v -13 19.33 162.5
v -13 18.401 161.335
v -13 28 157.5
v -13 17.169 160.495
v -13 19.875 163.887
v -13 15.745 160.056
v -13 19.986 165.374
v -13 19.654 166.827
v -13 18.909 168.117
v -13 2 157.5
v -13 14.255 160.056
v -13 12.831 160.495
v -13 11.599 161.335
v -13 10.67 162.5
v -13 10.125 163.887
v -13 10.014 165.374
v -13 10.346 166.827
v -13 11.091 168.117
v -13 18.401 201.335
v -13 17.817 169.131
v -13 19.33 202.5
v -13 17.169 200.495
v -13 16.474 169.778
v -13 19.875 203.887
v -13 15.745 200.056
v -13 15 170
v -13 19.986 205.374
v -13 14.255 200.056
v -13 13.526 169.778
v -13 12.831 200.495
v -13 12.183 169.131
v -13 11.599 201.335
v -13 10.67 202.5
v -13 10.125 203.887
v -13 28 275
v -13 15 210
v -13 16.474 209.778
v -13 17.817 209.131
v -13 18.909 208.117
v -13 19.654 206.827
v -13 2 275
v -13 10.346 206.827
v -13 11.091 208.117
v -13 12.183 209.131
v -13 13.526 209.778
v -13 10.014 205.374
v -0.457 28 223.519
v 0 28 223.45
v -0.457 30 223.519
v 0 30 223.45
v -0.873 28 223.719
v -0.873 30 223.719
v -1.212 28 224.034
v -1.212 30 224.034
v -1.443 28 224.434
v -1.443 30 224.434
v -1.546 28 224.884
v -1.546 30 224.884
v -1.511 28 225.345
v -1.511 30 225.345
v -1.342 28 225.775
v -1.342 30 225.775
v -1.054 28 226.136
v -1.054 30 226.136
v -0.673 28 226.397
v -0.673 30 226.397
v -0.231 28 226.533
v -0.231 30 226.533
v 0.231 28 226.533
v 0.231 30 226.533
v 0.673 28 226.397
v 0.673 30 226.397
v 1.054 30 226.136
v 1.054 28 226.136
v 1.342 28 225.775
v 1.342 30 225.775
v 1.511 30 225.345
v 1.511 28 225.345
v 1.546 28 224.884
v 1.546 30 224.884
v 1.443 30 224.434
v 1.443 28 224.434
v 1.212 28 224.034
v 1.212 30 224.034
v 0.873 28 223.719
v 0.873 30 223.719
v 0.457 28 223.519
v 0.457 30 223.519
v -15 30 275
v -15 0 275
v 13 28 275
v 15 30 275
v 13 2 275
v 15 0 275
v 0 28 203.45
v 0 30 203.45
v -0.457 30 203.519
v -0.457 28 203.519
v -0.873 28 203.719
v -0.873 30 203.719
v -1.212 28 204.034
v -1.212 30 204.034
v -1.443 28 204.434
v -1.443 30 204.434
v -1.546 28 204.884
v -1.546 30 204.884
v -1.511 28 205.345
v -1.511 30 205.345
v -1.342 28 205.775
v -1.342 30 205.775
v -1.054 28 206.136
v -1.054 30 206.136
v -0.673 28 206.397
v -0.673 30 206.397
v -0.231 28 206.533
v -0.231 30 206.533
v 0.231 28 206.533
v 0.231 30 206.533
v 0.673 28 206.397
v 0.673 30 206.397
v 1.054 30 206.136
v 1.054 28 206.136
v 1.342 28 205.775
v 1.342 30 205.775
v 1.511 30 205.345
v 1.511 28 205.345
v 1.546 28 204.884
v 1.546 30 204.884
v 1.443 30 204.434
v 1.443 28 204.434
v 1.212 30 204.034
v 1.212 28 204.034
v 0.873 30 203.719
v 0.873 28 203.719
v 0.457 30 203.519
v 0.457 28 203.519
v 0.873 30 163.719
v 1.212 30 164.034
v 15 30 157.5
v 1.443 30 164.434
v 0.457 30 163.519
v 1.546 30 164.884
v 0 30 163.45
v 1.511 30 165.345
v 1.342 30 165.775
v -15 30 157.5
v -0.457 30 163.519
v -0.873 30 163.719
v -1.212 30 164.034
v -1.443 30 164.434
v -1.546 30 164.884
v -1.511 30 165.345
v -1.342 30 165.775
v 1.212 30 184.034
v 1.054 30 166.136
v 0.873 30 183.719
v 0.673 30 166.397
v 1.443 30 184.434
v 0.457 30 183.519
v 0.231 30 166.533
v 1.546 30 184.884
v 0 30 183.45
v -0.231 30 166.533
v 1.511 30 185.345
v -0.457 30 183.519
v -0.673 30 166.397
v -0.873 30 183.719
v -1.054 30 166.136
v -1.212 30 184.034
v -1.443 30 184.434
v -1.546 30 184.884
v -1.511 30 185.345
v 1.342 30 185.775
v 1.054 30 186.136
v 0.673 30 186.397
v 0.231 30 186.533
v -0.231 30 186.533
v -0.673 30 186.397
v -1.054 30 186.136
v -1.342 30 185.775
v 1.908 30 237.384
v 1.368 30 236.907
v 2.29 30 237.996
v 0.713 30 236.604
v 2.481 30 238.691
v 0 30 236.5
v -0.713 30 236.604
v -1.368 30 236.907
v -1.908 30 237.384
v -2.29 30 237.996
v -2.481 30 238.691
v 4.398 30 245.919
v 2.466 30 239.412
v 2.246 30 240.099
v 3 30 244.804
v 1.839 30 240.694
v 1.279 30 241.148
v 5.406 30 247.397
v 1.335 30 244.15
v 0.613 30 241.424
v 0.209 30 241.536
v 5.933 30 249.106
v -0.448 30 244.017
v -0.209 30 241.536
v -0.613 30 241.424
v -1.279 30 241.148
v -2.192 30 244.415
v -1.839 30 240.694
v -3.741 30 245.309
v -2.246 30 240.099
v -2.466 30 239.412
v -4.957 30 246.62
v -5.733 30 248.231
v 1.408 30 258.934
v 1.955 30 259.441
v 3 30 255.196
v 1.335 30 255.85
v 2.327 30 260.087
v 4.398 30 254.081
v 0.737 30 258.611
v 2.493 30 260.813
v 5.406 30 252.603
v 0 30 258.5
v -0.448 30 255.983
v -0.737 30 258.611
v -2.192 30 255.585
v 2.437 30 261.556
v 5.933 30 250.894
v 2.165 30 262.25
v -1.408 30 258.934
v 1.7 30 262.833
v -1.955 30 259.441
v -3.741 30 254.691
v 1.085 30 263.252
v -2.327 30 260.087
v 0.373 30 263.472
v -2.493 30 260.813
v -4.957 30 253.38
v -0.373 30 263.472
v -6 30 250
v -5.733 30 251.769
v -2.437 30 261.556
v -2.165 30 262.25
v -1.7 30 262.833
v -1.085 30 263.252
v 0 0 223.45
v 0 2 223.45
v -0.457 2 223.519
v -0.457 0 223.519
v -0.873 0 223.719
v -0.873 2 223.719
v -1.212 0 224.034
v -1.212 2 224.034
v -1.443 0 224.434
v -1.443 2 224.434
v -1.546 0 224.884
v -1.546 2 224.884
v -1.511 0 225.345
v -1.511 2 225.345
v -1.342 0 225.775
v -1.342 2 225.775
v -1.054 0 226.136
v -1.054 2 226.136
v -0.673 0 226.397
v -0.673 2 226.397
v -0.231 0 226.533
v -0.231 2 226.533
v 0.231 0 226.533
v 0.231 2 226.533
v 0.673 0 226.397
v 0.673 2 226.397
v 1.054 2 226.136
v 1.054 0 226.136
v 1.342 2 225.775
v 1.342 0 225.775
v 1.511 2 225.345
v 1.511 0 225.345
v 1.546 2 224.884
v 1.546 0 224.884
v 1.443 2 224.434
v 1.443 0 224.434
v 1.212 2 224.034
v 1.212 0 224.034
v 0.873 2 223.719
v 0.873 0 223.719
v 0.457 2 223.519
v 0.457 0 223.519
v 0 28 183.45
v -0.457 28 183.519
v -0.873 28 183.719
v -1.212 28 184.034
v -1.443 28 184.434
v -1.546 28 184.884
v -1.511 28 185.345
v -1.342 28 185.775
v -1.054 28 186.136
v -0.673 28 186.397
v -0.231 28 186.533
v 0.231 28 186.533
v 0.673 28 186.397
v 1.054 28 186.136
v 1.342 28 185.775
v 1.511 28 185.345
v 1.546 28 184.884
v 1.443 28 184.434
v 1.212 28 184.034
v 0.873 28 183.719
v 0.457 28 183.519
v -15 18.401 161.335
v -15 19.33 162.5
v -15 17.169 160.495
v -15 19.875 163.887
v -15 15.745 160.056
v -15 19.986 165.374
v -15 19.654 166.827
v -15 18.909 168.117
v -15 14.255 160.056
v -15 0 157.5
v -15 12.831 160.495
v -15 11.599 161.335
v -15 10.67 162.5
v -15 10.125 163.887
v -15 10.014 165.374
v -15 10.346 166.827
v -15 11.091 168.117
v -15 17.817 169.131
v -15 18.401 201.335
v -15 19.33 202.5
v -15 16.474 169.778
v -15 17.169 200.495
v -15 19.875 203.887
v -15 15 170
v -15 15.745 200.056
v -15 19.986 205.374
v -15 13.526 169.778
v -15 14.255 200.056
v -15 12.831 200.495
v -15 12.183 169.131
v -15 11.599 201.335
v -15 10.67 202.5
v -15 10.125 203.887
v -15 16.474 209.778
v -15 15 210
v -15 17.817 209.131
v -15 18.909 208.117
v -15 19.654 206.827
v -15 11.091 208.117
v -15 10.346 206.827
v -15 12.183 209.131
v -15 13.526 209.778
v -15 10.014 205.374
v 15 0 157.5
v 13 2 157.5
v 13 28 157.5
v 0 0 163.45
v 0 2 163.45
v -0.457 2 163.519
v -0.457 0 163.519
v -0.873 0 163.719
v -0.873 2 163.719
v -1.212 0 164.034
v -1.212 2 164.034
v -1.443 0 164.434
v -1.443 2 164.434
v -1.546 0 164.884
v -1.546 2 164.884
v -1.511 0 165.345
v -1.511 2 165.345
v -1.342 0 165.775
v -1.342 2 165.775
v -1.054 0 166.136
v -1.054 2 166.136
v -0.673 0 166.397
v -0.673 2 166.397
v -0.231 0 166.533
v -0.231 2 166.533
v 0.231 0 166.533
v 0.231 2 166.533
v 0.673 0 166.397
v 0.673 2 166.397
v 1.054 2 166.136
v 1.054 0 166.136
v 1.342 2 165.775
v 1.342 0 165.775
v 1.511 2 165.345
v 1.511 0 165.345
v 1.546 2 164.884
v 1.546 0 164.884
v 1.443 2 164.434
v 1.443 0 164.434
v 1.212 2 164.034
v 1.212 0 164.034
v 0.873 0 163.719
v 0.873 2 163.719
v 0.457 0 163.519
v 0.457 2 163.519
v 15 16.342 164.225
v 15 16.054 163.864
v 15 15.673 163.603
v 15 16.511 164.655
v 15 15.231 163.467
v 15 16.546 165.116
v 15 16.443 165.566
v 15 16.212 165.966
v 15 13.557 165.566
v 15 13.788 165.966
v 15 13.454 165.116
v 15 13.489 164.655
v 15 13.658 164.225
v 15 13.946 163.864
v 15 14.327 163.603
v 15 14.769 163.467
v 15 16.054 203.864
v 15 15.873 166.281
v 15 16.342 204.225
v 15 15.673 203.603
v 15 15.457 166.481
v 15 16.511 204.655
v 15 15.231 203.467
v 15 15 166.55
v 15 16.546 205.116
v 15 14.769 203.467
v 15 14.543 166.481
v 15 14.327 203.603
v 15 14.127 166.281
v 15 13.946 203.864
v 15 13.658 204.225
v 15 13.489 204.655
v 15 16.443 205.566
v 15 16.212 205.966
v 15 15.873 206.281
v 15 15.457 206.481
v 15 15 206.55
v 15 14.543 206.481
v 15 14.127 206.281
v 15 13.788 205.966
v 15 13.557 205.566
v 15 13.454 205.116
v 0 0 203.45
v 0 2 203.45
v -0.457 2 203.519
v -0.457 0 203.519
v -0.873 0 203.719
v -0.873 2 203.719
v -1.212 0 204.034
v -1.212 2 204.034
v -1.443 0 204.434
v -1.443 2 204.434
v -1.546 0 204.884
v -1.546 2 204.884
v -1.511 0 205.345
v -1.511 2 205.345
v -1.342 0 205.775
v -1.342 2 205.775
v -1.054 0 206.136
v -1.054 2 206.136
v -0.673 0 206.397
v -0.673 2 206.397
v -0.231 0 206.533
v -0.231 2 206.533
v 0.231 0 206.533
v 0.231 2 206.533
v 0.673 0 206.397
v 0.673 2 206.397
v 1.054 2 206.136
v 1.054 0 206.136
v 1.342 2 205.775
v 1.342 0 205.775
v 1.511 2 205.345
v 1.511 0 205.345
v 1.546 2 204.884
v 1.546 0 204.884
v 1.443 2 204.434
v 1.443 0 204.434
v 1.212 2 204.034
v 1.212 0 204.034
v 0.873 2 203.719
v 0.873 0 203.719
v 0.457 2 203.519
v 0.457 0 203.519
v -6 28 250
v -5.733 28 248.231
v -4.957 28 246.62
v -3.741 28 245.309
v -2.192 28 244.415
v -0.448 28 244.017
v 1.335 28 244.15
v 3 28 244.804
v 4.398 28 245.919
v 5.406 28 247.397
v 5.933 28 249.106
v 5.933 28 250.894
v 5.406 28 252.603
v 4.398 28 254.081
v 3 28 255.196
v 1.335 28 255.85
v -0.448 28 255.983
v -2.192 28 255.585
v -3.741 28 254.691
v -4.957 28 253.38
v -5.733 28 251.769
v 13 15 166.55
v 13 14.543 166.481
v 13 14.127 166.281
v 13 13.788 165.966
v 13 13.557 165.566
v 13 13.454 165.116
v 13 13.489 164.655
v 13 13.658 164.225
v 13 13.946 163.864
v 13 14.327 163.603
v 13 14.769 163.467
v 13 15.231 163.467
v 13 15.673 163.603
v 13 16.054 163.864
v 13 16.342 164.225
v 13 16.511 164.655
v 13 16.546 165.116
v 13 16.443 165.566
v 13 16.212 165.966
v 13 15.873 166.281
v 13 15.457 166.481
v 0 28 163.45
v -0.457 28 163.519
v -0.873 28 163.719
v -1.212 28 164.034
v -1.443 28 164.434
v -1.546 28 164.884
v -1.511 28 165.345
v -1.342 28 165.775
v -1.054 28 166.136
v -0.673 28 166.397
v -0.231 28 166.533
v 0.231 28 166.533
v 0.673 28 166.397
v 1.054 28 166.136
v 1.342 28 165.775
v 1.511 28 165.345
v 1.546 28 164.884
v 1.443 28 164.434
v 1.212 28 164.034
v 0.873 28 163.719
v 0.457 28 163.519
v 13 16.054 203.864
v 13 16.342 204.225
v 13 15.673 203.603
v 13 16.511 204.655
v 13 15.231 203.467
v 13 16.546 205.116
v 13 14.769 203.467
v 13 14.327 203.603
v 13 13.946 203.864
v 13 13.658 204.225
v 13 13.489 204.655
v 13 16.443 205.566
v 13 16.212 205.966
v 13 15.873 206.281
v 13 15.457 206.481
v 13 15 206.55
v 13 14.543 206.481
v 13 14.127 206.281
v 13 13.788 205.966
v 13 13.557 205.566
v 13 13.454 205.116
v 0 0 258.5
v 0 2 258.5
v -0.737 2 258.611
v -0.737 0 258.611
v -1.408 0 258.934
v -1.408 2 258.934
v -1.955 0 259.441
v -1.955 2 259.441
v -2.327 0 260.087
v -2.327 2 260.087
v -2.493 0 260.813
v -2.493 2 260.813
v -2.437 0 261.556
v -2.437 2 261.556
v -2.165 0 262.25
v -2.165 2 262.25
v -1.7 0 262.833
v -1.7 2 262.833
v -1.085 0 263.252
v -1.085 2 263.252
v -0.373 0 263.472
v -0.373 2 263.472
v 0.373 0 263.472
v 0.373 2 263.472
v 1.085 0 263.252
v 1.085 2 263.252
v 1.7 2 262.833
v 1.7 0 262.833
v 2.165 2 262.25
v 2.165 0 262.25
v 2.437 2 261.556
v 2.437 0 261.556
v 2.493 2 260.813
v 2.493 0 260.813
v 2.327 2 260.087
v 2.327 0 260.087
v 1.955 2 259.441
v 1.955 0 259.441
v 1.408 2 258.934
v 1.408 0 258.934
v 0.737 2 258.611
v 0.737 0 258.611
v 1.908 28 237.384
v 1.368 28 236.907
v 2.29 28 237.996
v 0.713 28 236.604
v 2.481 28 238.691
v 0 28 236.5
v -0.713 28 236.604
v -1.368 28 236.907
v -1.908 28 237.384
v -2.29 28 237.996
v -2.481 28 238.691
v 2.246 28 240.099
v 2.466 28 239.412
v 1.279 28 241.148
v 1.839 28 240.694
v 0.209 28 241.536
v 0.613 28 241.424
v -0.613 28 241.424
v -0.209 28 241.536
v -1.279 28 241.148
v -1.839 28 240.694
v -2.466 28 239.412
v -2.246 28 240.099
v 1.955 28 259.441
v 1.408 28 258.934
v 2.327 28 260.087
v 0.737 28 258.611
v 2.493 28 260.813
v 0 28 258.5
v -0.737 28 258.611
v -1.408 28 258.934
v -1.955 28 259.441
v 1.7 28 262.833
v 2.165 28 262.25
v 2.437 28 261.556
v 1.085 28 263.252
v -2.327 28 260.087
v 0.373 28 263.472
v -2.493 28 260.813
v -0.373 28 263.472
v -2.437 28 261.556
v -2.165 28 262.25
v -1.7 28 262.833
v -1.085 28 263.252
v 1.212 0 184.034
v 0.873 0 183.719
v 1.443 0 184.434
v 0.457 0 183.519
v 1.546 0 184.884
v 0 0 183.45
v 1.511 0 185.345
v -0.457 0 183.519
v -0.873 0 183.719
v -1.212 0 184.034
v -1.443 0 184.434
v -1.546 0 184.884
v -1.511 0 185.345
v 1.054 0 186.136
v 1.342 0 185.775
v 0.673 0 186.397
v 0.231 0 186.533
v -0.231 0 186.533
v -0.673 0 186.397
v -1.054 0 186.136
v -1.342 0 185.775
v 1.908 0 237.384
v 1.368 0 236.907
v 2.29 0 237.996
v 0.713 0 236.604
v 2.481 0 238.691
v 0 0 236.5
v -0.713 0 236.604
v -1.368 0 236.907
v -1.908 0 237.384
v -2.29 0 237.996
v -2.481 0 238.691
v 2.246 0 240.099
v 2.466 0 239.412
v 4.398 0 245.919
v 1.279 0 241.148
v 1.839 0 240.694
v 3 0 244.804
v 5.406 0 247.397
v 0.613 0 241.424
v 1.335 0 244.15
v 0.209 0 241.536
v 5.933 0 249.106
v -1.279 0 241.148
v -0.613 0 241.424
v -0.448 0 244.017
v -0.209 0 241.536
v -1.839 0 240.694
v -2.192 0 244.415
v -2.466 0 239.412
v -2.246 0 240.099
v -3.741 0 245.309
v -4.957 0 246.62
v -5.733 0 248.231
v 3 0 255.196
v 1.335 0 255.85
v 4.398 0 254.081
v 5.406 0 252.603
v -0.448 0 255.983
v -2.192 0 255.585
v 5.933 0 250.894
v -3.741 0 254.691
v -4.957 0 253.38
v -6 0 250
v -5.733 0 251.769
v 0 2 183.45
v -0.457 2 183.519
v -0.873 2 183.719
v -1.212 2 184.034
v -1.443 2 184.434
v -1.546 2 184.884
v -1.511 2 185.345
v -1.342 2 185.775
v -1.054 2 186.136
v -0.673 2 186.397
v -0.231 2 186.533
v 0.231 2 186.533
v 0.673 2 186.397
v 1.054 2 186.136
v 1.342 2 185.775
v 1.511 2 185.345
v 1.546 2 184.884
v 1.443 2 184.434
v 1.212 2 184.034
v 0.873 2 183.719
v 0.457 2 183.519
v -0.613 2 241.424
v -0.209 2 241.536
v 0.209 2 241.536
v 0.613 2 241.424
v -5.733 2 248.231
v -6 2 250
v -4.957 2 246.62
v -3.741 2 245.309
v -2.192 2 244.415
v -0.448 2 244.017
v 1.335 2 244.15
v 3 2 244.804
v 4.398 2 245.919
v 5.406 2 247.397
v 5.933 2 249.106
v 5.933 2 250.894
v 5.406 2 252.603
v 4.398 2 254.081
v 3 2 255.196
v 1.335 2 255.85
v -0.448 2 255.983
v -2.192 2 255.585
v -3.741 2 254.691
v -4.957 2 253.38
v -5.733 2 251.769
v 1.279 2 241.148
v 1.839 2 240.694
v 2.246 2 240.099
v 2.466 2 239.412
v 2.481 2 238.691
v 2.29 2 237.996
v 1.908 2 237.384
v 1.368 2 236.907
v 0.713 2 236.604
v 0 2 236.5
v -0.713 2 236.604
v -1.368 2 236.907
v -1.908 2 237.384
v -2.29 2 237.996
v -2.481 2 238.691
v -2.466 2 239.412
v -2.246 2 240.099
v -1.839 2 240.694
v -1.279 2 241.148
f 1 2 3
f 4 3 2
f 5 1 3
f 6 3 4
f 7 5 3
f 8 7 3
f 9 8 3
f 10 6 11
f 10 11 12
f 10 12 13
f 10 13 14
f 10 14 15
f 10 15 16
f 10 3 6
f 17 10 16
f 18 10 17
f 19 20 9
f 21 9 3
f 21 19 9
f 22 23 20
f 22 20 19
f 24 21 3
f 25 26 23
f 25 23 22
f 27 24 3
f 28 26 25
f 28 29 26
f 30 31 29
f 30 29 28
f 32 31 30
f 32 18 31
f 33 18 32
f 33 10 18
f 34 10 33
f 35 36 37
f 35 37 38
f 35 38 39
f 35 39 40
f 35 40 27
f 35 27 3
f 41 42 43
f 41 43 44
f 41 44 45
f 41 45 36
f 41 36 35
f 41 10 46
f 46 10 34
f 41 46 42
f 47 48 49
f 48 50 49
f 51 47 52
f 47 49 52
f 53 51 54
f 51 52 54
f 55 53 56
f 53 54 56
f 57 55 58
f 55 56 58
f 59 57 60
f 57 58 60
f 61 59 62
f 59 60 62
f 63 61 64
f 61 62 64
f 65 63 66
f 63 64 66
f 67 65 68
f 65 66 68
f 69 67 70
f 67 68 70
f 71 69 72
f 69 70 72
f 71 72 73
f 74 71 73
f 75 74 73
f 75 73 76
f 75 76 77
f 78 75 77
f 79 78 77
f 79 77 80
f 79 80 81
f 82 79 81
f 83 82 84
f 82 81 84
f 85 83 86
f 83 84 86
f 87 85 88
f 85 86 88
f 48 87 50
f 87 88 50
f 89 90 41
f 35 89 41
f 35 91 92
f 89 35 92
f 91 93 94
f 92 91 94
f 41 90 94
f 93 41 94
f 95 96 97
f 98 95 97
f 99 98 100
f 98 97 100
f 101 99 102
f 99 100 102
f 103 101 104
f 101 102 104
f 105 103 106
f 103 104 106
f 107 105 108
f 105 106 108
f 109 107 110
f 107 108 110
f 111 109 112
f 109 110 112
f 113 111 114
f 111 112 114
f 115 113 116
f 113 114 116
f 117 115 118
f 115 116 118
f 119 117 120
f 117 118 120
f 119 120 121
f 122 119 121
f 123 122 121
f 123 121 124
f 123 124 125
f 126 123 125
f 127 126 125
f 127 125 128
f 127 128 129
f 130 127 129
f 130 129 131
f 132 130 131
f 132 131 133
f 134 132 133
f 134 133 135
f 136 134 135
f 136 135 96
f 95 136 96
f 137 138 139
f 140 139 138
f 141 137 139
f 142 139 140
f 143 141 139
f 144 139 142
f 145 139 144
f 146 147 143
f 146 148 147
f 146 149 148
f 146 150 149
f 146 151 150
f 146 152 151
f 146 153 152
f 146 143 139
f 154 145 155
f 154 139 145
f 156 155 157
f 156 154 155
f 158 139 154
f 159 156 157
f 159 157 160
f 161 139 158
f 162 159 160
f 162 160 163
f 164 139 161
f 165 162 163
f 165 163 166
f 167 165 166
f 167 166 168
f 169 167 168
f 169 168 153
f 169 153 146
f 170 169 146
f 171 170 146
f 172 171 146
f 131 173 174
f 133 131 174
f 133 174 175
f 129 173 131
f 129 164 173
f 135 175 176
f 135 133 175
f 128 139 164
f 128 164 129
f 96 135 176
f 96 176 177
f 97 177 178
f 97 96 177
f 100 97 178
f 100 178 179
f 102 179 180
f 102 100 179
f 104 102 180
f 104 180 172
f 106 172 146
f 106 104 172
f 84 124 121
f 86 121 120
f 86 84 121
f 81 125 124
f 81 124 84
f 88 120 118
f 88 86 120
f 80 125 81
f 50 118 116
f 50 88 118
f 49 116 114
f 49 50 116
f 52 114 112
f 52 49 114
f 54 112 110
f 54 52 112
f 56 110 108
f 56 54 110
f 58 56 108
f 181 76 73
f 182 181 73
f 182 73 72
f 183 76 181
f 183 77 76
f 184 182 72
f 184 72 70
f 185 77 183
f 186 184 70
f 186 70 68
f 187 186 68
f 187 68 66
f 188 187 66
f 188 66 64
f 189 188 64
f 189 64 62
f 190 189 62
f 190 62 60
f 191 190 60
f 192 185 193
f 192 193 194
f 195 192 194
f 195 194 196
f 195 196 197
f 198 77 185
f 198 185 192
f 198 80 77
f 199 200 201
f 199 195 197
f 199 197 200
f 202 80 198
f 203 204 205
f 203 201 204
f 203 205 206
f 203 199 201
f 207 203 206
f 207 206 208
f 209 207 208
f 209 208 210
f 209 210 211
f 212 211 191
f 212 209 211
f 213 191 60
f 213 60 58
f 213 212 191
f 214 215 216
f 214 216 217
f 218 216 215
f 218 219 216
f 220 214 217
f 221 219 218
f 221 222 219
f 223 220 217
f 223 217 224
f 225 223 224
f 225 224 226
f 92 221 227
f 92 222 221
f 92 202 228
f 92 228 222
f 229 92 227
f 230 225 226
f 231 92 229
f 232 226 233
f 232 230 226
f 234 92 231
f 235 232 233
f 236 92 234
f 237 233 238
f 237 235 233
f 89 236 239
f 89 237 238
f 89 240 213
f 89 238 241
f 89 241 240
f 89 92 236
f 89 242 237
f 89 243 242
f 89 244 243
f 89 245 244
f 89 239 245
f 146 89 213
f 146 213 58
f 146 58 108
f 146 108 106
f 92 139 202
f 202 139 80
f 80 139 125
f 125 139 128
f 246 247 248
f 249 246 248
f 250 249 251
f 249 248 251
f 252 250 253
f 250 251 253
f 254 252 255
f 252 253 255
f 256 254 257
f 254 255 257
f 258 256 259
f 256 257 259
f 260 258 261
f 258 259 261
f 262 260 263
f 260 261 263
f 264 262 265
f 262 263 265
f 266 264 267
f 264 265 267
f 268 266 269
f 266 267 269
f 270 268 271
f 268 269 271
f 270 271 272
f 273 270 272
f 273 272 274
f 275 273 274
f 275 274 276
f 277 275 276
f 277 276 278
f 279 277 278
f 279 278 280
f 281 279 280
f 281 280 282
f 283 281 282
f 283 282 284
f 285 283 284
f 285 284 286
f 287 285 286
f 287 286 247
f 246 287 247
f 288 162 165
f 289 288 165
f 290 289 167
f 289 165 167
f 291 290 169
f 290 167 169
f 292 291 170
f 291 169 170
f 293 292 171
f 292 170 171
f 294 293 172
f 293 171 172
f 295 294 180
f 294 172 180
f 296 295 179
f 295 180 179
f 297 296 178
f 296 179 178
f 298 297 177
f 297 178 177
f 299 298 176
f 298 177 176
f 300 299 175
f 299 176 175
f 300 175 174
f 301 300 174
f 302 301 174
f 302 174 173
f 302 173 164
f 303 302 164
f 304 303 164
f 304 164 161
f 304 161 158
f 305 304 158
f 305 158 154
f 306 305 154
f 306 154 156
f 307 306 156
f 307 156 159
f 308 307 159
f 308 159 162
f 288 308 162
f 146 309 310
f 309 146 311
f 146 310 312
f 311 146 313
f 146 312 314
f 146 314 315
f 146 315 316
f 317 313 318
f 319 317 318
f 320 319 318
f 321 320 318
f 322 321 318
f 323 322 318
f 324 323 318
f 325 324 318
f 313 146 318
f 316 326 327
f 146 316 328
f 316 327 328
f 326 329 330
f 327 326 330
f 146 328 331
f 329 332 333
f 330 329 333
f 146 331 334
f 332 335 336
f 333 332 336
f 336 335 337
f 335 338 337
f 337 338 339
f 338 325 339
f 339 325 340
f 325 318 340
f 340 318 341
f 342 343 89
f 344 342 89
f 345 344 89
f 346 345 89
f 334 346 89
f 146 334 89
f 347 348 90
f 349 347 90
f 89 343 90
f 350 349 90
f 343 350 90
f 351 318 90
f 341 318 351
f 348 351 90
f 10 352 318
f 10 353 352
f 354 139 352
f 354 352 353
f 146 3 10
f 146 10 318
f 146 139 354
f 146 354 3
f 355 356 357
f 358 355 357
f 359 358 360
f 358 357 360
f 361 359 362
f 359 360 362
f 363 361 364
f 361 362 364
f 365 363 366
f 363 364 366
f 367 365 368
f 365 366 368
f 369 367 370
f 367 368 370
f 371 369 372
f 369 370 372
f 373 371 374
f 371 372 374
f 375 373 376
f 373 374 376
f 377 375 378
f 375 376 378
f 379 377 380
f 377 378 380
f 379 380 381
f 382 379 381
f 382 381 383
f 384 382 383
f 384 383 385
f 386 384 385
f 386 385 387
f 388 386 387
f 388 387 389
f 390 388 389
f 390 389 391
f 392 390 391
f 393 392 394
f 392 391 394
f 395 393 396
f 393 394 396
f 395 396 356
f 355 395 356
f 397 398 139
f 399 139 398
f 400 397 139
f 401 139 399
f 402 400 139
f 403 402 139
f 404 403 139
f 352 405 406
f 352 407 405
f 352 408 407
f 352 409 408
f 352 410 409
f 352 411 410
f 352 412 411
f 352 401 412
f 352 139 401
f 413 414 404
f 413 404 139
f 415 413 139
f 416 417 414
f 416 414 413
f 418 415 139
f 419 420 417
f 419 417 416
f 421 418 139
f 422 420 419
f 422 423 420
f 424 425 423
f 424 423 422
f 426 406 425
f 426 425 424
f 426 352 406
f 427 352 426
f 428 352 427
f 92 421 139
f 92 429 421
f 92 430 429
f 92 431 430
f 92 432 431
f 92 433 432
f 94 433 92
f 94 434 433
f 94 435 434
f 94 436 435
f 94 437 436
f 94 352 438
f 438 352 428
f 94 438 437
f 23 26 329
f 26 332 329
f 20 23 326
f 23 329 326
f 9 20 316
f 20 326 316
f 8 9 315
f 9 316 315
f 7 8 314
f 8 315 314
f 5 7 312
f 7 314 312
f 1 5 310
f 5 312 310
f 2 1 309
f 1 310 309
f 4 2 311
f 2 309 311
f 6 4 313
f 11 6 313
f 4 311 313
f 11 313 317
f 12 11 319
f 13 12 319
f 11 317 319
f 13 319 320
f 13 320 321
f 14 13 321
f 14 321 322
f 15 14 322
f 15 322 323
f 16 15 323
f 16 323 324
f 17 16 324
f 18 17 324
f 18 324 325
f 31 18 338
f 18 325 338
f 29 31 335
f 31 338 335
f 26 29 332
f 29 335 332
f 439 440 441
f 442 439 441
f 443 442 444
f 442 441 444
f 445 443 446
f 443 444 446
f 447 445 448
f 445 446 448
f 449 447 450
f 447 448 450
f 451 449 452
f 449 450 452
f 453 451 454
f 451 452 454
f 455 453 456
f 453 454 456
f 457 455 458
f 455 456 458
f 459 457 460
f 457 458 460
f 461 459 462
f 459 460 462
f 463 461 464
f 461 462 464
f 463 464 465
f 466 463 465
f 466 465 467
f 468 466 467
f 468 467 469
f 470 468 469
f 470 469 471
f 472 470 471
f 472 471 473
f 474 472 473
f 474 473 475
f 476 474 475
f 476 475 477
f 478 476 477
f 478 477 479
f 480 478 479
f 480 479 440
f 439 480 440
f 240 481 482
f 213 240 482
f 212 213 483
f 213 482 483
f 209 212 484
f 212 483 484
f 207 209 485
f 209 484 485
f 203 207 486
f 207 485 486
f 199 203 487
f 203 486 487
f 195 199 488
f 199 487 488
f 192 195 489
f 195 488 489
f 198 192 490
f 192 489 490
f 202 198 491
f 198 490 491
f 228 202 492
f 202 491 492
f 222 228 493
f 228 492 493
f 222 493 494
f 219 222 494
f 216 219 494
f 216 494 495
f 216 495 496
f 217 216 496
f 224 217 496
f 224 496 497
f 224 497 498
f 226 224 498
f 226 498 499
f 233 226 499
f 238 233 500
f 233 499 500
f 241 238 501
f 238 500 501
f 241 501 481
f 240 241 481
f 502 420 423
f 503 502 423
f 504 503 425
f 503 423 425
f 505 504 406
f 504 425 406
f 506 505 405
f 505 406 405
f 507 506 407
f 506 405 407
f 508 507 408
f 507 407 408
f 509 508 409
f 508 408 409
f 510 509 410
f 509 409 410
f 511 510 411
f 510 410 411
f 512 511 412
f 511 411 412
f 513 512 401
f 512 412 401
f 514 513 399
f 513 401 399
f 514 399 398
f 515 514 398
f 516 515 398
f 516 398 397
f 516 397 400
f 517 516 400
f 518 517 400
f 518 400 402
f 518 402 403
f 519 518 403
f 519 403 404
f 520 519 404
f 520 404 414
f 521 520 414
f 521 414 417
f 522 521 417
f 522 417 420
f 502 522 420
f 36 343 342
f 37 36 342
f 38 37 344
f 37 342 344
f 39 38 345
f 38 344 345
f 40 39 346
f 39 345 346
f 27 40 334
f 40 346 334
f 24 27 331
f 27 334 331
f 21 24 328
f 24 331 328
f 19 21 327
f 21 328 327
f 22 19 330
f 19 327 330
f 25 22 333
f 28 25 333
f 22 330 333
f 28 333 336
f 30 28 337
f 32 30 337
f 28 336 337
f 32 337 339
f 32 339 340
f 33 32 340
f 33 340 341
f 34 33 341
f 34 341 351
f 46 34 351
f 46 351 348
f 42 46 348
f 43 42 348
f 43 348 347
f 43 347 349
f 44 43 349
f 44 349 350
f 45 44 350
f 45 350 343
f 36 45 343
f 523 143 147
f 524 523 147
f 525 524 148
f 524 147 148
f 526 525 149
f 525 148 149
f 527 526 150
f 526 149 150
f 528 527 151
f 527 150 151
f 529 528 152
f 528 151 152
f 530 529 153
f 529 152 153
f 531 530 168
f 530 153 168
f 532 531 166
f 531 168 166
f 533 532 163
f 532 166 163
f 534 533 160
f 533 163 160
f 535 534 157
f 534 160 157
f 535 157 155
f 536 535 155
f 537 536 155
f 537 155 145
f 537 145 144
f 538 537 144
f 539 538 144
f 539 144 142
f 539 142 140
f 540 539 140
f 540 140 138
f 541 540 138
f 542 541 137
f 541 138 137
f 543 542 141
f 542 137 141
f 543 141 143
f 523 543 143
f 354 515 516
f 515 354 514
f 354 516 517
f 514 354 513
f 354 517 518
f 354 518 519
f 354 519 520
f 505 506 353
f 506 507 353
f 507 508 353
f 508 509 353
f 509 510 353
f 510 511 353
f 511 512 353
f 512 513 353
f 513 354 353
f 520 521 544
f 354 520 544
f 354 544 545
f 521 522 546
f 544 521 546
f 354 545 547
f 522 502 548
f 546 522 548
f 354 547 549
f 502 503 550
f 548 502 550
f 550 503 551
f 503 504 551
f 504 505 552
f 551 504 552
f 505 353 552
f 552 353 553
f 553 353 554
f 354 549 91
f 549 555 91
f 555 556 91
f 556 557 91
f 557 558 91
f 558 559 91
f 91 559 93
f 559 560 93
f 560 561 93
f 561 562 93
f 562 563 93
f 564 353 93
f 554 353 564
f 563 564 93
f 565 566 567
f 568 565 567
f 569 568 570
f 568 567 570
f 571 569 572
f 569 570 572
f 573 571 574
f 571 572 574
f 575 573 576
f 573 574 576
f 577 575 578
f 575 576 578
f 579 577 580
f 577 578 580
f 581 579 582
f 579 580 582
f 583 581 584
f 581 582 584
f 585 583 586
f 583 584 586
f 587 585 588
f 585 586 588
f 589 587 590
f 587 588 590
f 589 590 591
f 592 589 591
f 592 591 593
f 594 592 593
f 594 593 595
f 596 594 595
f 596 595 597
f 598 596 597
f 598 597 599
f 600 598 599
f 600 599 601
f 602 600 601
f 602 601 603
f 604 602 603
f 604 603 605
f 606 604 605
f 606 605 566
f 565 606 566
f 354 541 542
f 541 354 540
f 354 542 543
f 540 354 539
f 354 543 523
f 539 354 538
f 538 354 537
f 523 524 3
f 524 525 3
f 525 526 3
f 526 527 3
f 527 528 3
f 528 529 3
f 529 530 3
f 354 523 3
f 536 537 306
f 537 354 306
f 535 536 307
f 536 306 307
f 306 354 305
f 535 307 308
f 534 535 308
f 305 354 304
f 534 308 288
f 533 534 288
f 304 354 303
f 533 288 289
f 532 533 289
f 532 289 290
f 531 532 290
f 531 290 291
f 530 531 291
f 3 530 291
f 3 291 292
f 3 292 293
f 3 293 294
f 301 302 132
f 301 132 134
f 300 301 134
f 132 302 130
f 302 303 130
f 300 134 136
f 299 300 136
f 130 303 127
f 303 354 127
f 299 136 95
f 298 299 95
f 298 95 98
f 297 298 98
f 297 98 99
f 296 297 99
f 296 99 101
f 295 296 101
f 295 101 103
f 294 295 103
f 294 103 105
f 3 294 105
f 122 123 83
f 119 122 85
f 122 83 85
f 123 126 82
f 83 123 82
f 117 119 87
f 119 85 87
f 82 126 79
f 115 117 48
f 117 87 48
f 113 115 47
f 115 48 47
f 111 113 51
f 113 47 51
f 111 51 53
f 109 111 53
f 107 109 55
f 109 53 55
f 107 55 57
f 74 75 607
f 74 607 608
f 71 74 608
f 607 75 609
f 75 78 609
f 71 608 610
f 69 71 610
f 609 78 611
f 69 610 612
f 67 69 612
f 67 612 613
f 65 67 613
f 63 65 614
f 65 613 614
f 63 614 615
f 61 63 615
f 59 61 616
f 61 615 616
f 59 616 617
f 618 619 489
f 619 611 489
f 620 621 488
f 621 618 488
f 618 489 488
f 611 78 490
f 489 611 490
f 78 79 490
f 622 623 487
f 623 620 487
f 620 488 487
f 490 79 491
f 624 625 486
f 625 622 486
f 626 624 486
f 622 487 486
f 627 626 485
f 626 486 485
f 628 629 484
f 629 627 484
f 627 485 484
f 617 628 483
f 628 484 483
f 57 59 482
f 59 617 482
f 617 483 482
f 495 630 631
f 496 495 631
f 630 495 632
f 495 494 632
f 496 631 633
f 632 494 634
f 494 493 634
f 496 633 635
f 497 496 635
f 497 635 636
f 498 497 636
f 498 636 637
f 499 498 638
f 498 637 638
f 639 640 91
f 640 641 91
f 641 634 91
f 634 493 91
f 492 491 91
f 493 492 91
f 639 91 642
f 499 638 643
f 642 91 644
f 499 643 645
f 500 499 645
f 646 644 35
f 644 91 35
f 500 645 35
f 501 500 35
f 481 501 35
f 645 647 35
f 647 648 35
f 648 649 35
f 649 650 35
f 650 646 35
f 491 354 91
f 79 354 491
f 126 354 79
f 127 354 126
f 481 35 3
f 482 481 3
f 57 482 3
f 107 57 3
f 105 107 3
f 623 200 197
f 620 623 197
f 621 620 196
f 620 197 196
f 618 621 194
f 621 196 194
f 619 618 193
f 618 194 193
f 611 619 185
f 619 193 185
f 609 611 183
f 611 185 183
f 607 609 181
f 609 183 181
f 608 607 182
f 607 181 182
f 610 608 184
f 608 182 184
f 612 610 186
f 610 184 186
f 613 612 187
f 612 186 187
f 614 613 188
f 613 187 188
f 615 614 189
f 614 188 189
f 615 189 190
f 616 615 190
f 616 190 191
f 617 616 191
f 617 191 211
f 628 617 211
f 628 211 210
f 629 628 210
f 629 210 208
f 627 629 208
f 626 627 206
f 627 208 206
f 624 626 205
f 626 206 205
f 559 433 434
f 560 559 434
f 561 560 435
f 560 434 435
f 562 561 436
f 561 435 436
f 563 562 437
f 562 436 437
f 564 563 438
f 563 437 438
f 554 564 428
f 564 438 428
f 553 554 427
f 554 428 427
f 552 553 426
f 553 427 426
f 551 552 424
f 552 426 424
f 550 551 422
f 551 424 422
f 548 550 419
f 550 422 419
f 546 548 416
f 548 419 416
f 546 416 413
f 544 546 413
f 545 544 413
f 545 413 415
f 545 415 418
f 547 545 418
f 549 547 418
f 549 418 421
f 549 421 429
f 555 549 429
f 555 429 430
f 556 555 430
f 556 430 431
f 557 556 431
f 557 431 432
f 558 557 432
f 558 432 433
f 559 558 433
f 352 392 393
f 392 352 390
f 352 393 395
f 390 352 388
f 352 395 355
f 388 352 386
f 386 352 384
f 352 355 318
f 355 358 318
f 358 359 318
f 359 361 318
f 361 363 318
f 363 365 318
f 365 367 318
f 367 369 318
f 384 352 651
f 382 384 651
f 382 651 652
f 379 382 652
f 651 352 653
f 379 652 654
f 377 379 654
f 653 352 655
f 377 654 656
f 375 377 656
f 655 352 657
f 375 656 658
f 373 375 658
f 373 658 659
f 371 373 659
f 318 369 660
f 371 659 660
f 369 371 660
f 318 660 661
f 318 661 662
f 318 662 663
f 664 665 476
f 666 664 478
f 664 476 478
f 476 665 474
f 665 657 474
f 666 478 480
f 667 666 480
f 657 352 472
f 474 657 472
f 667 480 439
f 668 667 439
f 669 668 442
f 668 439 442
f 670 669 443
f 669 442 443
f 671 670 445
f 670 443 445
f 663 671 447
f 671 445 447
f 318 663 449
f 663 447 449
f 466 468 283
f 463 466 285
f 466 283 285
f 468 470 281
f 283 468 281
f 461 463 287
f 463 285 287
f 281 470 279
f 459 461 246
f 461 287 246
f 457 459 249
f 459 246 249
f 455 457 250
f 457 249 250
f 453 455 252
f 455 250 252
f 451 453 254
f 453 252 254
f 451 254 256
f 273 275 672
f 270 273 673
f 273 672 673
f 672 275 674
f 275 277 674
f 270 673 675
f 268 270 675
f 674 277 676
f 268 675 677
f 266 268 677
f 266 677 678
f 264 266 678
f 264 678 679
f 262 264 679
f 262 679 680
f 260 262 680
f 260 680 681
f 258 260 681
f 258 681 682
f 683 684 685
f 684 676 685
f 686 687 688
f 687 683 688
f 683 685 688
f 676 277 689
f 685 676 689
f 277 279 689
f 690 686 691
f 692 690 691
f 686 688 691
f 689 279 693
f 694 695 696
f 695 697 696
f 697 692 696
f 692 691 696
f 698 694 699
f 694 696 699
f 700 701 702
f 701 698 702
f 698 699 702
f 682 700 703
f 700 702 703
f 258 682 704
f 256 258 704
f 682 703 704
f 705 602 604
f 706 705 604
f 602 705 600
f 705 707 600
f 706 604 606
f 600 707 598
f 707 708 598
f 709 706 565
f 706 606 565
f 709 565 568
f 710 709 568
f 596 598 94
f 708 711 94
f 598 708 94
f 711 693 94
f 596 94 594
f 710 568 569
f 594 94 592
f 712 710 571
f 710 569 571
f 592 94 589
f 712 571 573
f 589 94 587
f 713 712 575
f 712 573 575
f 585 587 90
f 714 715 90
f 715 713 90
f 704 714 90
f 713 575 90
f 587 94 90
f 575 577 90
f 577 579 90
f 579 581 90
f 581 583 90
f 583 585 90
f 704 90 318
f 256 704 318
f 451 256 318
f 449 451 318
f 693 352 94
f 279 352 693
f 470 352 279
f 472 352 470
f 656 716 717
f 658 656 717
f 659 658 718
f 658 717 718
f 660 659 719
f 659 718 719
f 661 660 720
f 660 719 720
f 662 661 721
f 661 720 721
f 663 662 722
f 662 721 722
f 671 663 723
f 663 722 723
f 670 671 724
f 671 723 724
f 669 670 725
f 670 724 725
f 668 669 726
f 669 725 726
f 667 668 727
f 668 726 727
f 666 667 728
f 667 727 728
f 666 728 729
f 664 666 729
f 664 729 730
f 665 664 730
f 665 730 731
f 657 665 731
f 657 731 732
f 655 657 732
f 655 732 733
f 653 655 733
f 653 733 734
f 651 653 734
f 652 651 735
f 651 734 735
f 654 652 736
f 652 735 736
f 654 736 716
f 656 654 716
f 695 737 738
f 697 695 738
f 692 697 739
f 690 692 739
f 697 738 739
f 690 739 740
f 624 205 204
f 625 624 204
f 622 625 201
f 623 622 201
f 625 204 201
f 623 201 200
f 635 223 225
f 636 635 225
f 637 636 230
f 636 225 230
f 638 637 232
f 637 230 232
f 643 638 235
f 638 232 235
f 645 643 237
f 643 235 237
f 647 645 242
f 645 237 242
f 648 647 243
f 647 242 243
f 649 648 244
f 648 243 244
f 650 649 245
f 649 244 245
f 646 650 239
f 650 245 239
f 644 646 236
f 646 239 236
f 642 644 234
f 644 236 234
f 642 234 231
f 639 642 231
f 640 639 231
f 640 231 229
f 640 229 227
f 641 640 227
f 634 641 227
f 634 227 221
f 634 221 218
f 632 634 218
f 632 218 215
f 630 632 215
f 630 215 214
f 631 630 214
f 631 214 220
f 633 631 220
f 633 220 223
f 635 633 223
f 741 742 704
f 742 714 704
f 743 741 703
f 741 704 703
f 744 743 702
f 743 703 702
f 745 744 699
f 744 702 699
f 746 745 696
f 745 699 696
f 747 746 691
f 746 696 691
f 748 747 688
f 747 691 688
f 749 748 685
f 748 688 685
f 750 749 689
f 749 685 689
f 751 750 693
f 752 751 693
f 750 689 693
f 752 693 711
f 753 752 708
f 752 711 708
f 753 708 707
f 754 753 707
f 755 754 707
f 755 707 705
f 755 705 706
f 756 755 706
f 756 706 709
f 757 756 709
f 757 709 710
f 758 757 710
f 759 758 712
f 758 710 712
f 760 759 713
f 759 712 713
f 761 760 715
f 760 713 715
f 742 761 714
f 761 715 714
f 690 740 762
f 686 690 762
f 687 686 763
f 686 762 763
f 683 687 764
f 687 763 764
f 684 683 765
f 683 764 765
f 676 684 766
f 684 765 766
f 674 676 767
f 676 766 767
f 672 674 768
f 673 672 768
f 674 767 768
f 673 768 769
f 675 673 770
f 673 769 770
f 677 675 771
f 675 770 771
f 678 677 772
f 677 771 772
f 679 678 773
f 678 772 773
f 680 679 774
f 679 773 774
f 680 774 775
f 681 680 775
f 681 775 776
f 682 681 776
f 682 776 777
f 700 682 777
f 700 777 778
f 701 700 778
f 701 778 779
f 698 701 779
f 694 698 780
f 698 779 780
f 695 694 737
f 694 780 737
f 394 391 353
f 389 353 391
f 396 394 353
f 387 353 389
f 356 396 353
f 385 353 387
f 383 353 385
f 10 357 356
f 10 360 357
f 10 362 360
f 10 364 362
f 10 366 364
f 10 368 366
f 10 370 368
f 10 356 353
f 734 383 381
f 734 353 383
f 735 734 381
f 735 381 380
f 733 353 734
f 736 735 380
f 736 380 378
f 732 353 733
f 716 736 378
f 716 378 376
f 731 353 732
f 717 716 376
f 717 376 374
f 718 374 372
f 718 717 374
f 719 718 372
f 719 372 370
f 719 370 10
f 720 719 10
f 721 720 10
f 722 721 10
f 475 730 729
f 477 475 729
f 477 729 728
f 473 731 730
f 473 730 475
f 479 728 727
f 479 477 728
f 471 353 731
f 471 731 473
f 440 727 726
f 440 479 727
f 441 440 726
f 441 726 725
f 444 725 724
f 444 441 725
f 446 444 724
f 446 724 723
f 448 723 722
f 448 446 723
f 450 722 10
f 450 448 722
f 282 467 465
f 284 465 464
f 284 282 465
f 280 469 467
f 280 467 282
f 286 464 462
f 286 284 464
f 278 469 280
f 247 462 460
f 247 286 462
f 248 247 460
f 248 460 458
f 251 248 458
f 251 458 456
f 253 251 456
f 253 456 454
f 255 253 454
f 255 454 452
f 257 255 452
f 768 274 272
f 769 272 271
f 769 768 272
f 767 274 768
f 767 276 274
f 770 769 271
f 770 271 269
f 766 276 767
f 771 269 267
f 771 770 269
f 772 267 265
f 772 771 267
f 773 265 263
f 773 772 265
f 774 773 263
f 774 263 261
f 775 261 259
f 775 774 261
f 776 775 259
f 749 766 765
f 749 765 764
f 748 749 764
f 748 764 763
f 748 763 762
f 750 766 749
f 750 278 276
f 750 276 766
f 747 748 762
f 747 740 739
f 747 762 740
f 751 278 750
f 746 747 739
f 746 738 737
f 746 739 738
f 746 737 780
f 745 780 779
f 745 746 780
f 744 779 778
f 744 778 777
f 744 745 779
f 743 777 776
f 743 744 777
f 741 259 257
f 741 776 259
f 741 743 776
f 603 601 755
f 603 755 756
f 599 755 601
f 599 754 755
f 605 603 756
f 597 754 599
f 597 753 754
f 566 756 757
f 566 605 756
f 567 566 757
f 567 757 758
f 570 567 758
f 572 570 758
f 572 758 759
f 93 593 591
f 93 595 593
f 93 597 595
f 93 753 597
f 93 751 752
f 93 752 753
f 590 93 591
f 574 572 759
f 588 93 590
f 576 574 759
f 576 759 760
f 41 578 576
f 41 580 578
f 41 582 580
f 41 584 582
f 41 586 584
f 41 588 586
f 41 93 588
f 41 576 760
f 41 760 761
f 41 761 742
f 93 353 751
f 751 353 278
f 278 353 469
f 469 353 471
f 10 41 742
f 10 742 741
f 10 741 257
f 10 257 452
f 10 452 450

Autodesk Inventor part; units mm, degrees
ref_plane "YZ Plane" through (0, 0, 0) normal (1, 0, 0) x (0, 1, 0)
ref_plane "XZ Plane" through (0, 0, 0) normal (0, 1, 0) x (-1, 0, 0)
ref_plane "XY Plane" through (0, 0, 0) normal (0, 0, 1) x (1, 0, 0)
sketch "スケッチ1" plane through (0, 0, 0) normal (0, 1, 0) x (-1, 0, 0)
  circle A0 centre (0, 0) radius 122.5
  line L0 (0, 0) -> (21.2719, 120.6389)
  line L1 (21.2719, 120.6389) -> (-21.2719, -120.6389)
  line L2 (21.2719, 120.6389) -> (-41.166, -233.4643)
  arc A1 (21.2719, 120.6389) -> (0, 122.5) centre (0, 0) ccw
  arc A2 (-21.2719, -120.6389) -> (0, -122.5) centre (0, 0) ccw
  arc A3 (-41.8975, -115.1123) -> (-21.2719, -120.6389) centre (0, 0) ccw
  circle A4 centre (0, 0) radius 125
  circle A5 centre (0, 0) radius 145
  arc A6 (-42.7525, -117.4616) -> (-105.9051, -66.4011) centre (0, 0) ccw
  line L3 (0, 0) -> (-42.7525, -117.4616) construction
  line L4 (21.706, 123.101) -> (21.706, 123.101)
  line L5 (0, -145) -> (0, -265.735)
  line L6 (0, 0) -> (-41.8975, -115.1123)
  line L7 (-49.5929, -136.2554) -> (-41.8975, -115.1123)
  line L8 (-42.7525, -117.4616) -> (-231.4975, -48.764)
  line L9 (42.7525, 117.4616) -> (0, 0)
  line L10 (0, -145) -> (0, 145)
  line L11 (0, 0) -> (0, 250)
  circle A7 centre (0, 250) radius 20
  line L12 (113.4405, 52.5) -> (18.1505, 258.4)
  line L13 (0, 0) -> (185.4327, 0)
  line L14 (0, 0) -> (-259.4726, 94.4403)
  line L15 (42.7525, 117.4616) -> (-253.7236, 225.3701)
  line L16 (0, 125) -> (22.0409, 125)
  line L17 (21.2719, 120.6389) -> (25.179, 142.7971)
  line L18 (42.7525, 117.4616) -> (60.6365, 166.5974)
  line L19 (15, 170) -> (59.0618, 170)
  line L20 (15.9946, 175) -> (56.7478, 175)
  line L21 (0, 125) -> (-15, 125)
  line L22 (-15, 125) -> (-15, 275)
  line L23 (-15, 275) -> (0, 275)
  line L24 (0, 275) -> (0, 125)
  line L25 (0, 125) -> (15, 125)
  line L26 (15, 125) -> (15, 275)
  line L27 (15, 275) -> (0, 275)
  line L28 (0, 275) -> (0, 125)
  line L29 (15, 200) -> (15, 275)
  line L30 (15, 275) -> (-15, 275)
  line L31 (-15, 275) -> (-15, 150)
  line L32 (15, 170) -> (37.5, 170)
  line L33 (37.5, 170) -> (17.5, 170)
  line L34 (0, 0) -> (0, 250)
  line L35 (0, -125) -> (42.7525, 117.4616)
  line L36 (-42.7525, -117.4616) -> (0, 125)
  line L37 (0, -125) -> (-3.519, -144.9573)
  line L38 (42.7525, 117.4616) -> (49.5929, 136.2554)
  line L39 (0, 125) -> (3.519, 144.9573)
  line L40 (-42.7525, -117.4616) -> (-46.2715, -137.4189)
  line L41 (42.7525, 117.4616) -> (46.2715, 137.4189)
  line L42 (-3.519, -144.9573) -> (46.2715, 137.4189)
  line L43 (46.2715, 137.4189) -> (37.2054, 139.0175)
  line L44 (-12.5852, -143.3587) -> (-3.519, -144.9573)
  line L45 (-46.2715, -137.4189) -> (3.519, 144.9573)
  line L46 (3.519, 144.9573) -> (12.5852, 143.3587)
  line L47 (-37.2054, -139.0175) -> (-46.2715, -137.4189)
  line L48 (-27.6373, -142.3418) -> (-22.7132, -143.21)
  line L49 (-27.6373, -142.3418) -> (-22.7132, -143.21)
  line L50 (-22.7132, -143.21) -> (27.641, 142.363)
  line L51 (27.641, 142.363) -> (22.717, 143.2312)
  line L52 (22.717, 143.2312) -> (-27.6373, -142.3418)
  line L53 (12.5852, 143.3587) -> (-37.2054, -139.0175)
  line L54 (-12.5852, -143.3587) -> (37.2054, 139.0175)
  line L55 (-42.1294, -138.1492) -> (7.6611, 144.2269)
  line L56 (-7.6611, -144.2269) -> (42.1294, 138.1492)
  line L57 (12.5852, 143.3587) -> (7.6611, 144.2269)
  line L58 (7.6611, 144.2269) -> (23.8851, 236.2374)
  line L59 (23.8851, 236.2374) -> (28.8091, 235.3692)
  line L60 (28.8091, 235.3692) -> (12.5852, 143.3587)
  line L61 (22.717, 143.2312) -> (25.179, 142.7971)
  line L62 (25.179, 142.7971) -> (42.462, 240.8141)
  line L63 (42.462, 240.8141) -> (40, 241.2482)
  line L64 (40, 241.2482) -> (22.717, 143.2312)
  line L65 (42.1294, 138.1492) -> (37.2054, 139.0175)
  line L66 (37.2054, 139.0175) -> (45.9435, 188.5741)
  line L67 (45.9435, 188.5741) -> (50.8676, 187.7058)
  line L68 (50.8676, 187.7058) -> (42.1294, 138.1492)
  line L69 (25.179, 142.7971) -> (27.641, 142.363)
  line L70 (27.641, 142.363) -> (39.8383, 211.5375)
  line L71 (39.8383, 211.5375) -> (37.3763, 211.9716)
  line L72 (37.3763, 211.9716) -> (25.179, 142.7971)
  line L73 (15.9946, 175) -> (15, 175)
  line L74 (15, 175) -> (0, 175)
  line L75 (0, 175) -> (0, 170)
  line L76 (0, 170) -> (15, 170)
  line L77 (15, 170) -> (15, 175)
  line L78 (20, 175) -> (40, 175)
  line L79 (40, 175) -> (40, 245)
  line L80 (40, 245) -> (20, 245)
  line L81 (20, 245) -> (20, 175)
  line L82 (30, 175) -> (30, 118.7697)
  line L83 (0, 175) -> (45.1779, 175)
  line L84 (45.1779, 175) -> (45.1779, 200)
  line L85 (45.1779, 200) -> (0, 200)
  line L86 (0, 200) -> (0, 175)
  line L87 (0, 200) -> (50, 200)
  line L88 (50, 200) -> (50, 170)
  line L89 (50, 170) -> (0, 170)
  line L90 (0, 170) -> (0, 200)
  line L91 (50, 170) -> (0, 170)
  line L92 (0, 170) -> (0, 165)
  line L93 (0, 200) -> (-15, 200)
  line L94 (-15, 200) -> (-15, 180)
  line L95 (-15, 180) -> (0, 180)
  line L96 (0, 180) -> (0, 200)
  line L97 (0, 180) -> (-15, 180)
  line L98 (-15, 180) -> (-15, 175)
  line L99 (-15, 175) -> (0, 175)
  line L100 (0, 175) -> (0, 180)
  line L101 (0, 145) -> (-15, 145)
  line L102 (-15, 145) -> (-20.5, 145)
  line L103 (-20.5, 145) -> (-20.5, 200)
  line L104 (-20.5, 200) -> (-15, 200)
  line L105 (-15, 200) -> (-15, 145)
  line L106 (-20.5, 150) -> (-25, 150)
  line L107 (-25, 150) -> (-25, 180)
  line L108 (-25, 180) -> (-20.5, 180)
  line L109 (-20.5, 180) -> (-20.5, 150)
  line L110 (50, 175) -> (-15, 175)
  line L111 (-15, 175) -> (-15, 170)
  line L112 (50, 170) -> (50, 175)
  line L113 (-20.5, 165) -> (-25, 165)
  line L114 (-25, 165) -> (-25, 195)
  line L115 (-25, 195) -> (-20.5, 195)
  line L116 (-20.5, 195) -> (-20.5, 165)
  line L117 (15, 250) -> (-15, 250)
  line L118 (-15, 145) -> (15, 145)
  line L119 (26.3471, 235.8033) -> (-39.6674, -138.5834)
  line L120 (48.4056, 188.14) -> (-10.1232, -143.7928)
  line L121 (49.3441, 179.0659) -> (14.8758, 185.1436)
  line L122 (-15, 138.4818) -> (-15, 121.5782)
  line L123 (-7.6611, -144.2269) -> (-42.1294, -138.1492)
  line L124 (-39.6243, -123.9424) -> (-5.1561, -130.02)
  line L125 (-42.2291, -138.7145) -> (-7.7608, -144.7922)
  line L126 (-41.3608, -133.7904) -> (-6.8926, -139.8681)
  line L127 (-6.0243, -134.9441) -> (-40.4926, -128.8664)
  line L128 (18.3488, 204.8397) -> (52.8171, 198.762)
  line L129 (50.2124, 183.9899) -> (45.0029, 154.4457)
  line L130 (10.5346, 160.5234) -> (15.7441, 190.0676)
  line L131 (19.217, 209.7638) -> (53.6853, 203.6861)
  line L132 (15, 250) -> (53.6853, 203.6861)
  line L133 (53.6853, 203.6861) -> (53.6853, 170)
  line L134 (53.6853, 170) -> (-15, 170)
  line L135 (-15, 172.5) -> (53.6853, 172.5)
  line L136 (15, 170) -> (15, 150)
  line L137 (15, 150) -> (-15, 150)
  line L138 (-15, 170) -> (15, 170)
  line L139 (15, 150) -> (-15, 150)
  line L140 (-15, 150) -> (-15, 275)
  line L141 (-15, 275) -> (15, 275)
  line L142 (15, 275) -> (15, 150)
  circle A8 centre (0, 250) radius 6
  circle A9 centre (0, 250) radius 11
  line L143 (47.7456, 170) -> (15, 150)
  point P0 (-25.1752, -142.7759)
  point P1 (42.3116, 114.9608)
  point P2 (0, 133.0222)
  point P3 (-38.8988, -134.2246)
  point P4 (-38.0306, -129.3005)
  point P5 (-23.2585, -131.9052)
  point P6 (-24.1267, -136.8293)
  point P7 (-9.3546, -139.434)
  point P8 (-8.4863, -134.51)
  point P9 (17.3379, 184.7094)
  point P10 (32.11, 182.1047)
  point P11 (46.8821, 179.5)
  point P12 (50.3551, 199.1962)
  point P13 (35.5829, 201.8009)
  point P14 (20.8108, 204.4056)
  point P15 (0, 240)
  point P16 (0, 190)
  point P17 (0, 239)
  point P18 (0, 261)
  point P19 (37.5, 172.5)
  point P20 (22.5, 172.5)
  point P21 (0, 275)
  point P22 (15, 185.1217)
  point P23 (15, 185.8477)
  point P24 (-11, 250)
  point P25 (11, 250)
  dimension "d0" = 245
  dimension "d7" = 290
  dimension "d19" = 40
  dimension "d1" = 0
  dimension "d4" = 42.5438
  dimension "d5" = 21.3532
  dimension "d6" = 250
  dimension "d10" = 0
  dimension "d12" = 0
  dimension "d13" = 10
  dimension "d15" = 0
  dimension "d16" = 9.8877
  dimension "d18" = 10
  dimension "d21" = 145
  dimension "d23" = 125
  dimension "d26" = 7.5384
  dimension "d30" = 180
  dimension "d34" = 180
  dimension "d35" = 45
  dimension "d37" = 5
  dimension "d38" = 15
  dimension "d39" = 150
  dimension "d40" = 15
  dimension "d41" = 150
  dimension "d47" = 250
  dimension "d52" = 5
  dimension "d53" = 0
  dimension "d54" = 10
  dimension "d55" = 10
  dimension "d56" = 5
  dimension "d57" = 5
  dimension "d60" = 5
  dimension "d61" = 20
  dimension "d62" = 70
  dimension "d63" = 5
  dimension "d65" = 25
  dimension "d66" = 50
  dimension "d68" = 20
  dimension "d69" = 5
  dimension "d74" = 20
  dimension "d75" = 5.5
  dimension "d76" = 55
  dimension "d77" = 4.5
  dimension "d78" = 30
  dimension "d79" = 5
  dimension "d82" = 15
  dimension "d83" = 50
  dimension "d87" = 16.9036
  dimension "d88" = 10.0392
  dimension "d89" = 10.5222
  dimension "d92" = 15
  dimension "d93" = 5
  dimension "d94" = 5
  dimension "d96" = 4.5
  dimension "d97" = 5
  dimension "d98" = 30
  dimension "d99" = 10
  dimension "d101" = 20
  dimension "d102" = 10
  dimension "d103" = 20
  dimension "d104" = 12
  dimension "d105" = 22
  dimension "d106" = 7.5
  dimension "d107" = 15
  dimension "d108" = 30
extrude "押し出し1" add sketch "スケッチ1" along normal blind 30 contours L137 L60 L26 | L60 L137 L119 L76 L26 | L76 L119 L26 | L137 L58 L76 L119 | L119 L76 L58 L135 L26 | L137 L11 L76 L58 | L26 L117 A9 L24 A7 | A7 L24 L27 L26 | L137 L22 L134 L11 | L135 L58 L74 L26 | L76 L11 L135 L58 | L24 A9 L117 L22 A7 | A7 L22 L23 L24 | L26 A7 L11 A9 L117 | L74 L58 L121 L26 | L135 L11 L74 L58 | L134 L22 L135 L11 | L26 L85 L11 A7 | A9 L117 A8 L24 | L24 A8 L117 A9 | A9 L11 A8 L117 | L121 L58 L26 | L74 L11 L85 L26 L58 | L135 L22 L99 L11 | A7 L22 L117 A9 L11 | L11 L93 L22 A7 | L117 A8 L11 A9 | L99 L22 L95 L11 | L11 L95 L22 L93
shell "シェル1" thickness 2 removed faces 3 at (-5, 10, 275) at (-5.9805, 20, 249.5172) at (5, 10, 150)
sketch "スケッチ3" plane through (0, 0, 0) normal (0, -1, 0) x (1, 0, 0)
  line L0 (15, 150) -> (-15, 150) projected
  line L1 (-13, 150) -> (-13, 275) projected
  point P0 (0, 0)
  point P1 (0, 165)
  point P2 (0, 150)
  point P3 (0, 240)
  point P4 (0, 185)
  point P5 (0, 205)
  point P6 (0, 225)
  dimension "d119" = 15
  dimension "d120" = 0
  dimension "d146" = 20
  dimension "d147" = 20
  dimension "d148" = 13
  dimension "d151" = 20
hole "穴1" at (0, 0, 239) at (0, 0, 261) direction (0, 1, 0) diameter 5 end through all
hole "穴2" at (0, 0, 165) at (0, 0, 240) at (0, 0, 205) at (0, 0, 185) at (0, 0, 225) direction (0, 1, 0) diameter 3.1 end through all
sketch "スケッチ4" plane through (-15, 0, 150) normal (-1, 0, 0) x (0, 0, 1)
  line L0 (0, 0) -> (0, 30) projected
  line L1 (0, 15) -> (125, 15)
  line L2 (125, 0) -> (125, 30) projected
  point P0 (-150, 0)
  point P1 (15, 15)
  point P2 (55, 15)
  dimension "d129" = 15
  dimension "d130" = 40
hole "穴3" at (-15, 15, 165) at (-15, 15, 205) direction (1, 0, 0) diameter 3.1 end through all
sketch "スケッチ6" plane through (-15, 0, 150) normal (-1, 0, 0) x (0, 0, 1)
  circle A0 centre (15, 15) radius 1.55 projected
  circle A1 centre (15, 15) radius 5
  circle A2 centre (55, 15) radius 1.55 projected
  circle A3 centre (55, 15) radius 5
  point P0 (-150, 0)
  dimension "d142" = 10
  dimension "d143" = 10
extrude "押し出し3" cut sketch "スケッチ6" against normal blind 5 contours A0 | A1 | A2 | A3
sketch "スケッチ7" plane through (15, 0, 150) normal (0, 0, -1) x (-1, 0, 0)
  line L0 (2, 2) -> (2, 28) projected
  line L1 (2, 28) -> (28, 28) projected
  line L2 (28, 28) -> (28, 2) projected
  line L3 (28, 2) -> (2, 2) projected
  line L4 (0, 0) -> (30, 0) projected
  line L5 (30, 0) -> (30, 30) projected
  line L6 (0, 30) -> (30, 30) projected
  line L7 (0, 0) -> (0, 30) projected
  point P0 (15, 0)
extrude "押し出し4" cut sketch "スケッチ7" against normal blind 7.5
equation "\"d18\" = d13"
properties part number "hand2_03" material "アルミニウム 6061-AHC"
